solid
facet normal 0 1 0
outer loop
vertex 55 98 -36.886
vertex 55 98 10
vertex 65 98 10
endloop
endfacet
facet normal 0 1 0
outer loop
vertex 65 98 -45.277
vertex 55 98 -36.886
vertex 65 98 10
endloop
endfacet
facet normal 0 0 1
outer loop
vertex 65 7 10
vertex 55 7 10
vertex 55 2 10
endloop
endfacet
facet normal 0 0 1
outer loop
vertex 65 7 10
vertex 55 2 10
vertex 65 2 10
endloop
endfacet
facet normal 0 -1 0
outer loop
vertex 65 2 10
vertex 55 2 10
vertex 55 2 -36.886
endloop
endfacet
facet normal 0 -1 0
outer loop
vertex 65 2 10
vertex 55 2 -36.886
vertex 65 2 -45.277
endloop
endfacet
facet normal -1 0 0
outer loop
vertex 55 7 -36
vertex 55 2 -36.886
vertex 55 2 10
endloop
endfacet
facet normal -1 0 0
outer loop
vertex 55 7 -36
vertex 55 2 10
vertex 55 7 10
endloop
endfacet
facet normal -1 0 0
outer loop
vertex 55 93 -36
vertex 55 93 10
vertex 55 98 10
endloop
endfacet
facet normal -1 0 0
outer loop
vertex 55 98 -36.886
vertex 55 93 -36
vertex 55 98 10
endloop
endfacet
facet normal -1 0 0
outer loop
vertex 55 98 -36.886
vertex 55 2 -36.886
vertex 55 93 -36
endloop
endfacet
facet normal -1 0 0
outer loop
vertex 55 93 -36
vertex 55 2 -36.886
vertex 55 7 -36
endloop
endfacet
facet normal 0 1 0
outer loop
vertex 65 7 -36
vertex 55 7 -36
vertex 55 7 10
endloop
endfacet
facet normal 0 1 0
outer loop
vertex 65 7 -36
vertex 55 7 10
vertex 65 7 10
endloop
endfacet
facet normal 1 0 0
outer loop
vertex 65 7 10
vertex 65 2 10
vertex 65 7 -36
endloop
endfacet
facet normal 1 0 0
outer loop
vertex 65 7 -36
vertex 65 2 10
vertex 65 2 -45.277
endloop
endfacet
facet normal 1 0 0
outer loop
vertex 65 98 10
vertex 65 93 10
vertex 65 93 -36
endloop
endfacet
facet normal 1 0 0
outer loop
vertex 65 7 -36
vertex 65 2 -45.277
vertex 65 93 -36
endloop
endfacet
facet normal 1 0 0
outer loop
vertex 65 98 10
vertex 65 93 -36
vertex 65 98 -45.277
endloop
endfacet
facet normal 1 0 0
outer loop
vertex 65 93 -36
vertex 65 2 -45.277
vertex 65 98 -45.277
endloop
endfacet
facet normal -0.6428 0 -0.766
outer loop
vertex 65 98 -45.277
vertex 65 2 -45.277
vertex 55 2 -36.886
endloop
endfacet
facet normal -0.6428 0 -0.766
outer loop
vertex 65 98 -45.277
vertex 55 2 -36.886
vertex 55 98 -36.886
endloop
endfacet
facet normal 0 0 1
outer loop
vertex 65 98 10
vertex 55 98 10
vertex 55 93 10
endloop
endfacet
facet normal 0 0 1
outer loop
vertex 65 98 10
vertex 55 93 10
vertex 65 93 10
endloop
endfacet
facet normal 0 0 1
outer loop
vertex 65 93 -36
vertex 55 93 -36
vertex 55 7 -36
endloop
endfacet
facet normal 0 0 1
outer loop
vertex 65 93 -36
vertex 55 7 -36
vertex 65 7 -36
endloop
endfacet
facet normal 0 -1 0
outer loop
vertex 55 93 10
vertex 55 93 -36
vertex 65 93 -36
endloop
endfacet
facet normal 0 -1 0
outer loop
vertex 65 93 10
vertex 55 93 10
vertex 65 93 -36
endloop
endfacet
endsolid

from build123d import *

# Parameters (mm, degrees)
BOX016_W               = 5
BOX016_H               = 96
BOX016_DEPTH           = 60
BOX016_PLACEMENT_ANGLE = 310
BOX015_W               = 5
BOX015_H               = 96
BOX015_DEPTH           = 60
BOX015_PLACEMENT_ANGLE = 310
BOX014_W               = 5
BOX014_H               = 86
BOX014_DEPTH           = 2
BOX011_W               = 5
BOX011_H               = 86
BOX011_DEPTH           = 24
BOX006_W               = 10
BOX006_H               = 86
BOX006_DEPTH           = 20
BOX005_W               = 5
BOX005_H               = 86
BOX005_DEPTH           = 49
BOX003_W               = 10
BOX003_H               = 96
BOX003_DEPTH           = 49
BOX007_W               = 10
BOX007_H               = 96
BOX007_DEPTH           = 10


with BuildPart() as cube016:
    # Box016 → Box016 (new body)
    with BuildSketch(Plane.XY):
        with Locations((2.5, 48)):
            Rectangle(BOX016_W, BOX016_H)
    extrude(amount=BOX016_DEPTH)


with BuildPart() as cube016_1:
    # Box016 placement: moved
    add(cube016.part.moved(Location((70, 2, -56))).rotate(Axis((70, 2, -56), (0, 1, 0)), BOX016_PLACEMENT_ANGLE))


with BuildPart() as cube015:
    # Box015 → Box015 (new body)
    with BuildSketch(Plane.XY):
        with Locations((2.5, 48)):
            Rectangle(BOX015_W, BOX015_H)
    extrude(amount=BOX015_DEPTH)


with BuildPart() as cube015_1:
    # Box015 placement: moved
    add(cube015.part.moved(Location((70, 2, -59))).rotate(Axis((70, 2, -59), (0, 1, 0)), BOX015_PLACEMENT_ANGLE))


with BuildPart() as cube014:
    # Box014 → Box014 (new body)
    with BuildSketch(Plane(origin=(55, 7, -36), x_dir=(1, 0, 0), z_dir=(0, 0, 1))):
        with Locations((2.5, 43)):
            Rectangle(BOX014_W, BOX014_H)
    extrude(amount=BOX014_DEPTH)


with BuildPart() as cube011:
    # Box011 → Box011 (new body)
    with BuildSketch(Plane(origin=(40, 7, -34), x_dir=(1, 0, 0), z_dir=(0, 0, 1))):
        with Locations((2.5, 43)):
            Rectangle(BOX011_W, BOX011_H)
    extrude(amount=BOX011_DEPTH)


with BuildPart() as cube006:
    # Box006 → Box006 (new body)
    with BuildSketch(Plane(origin=(40, 7, -10), x_dir=(1, 0, 0), z_dir=(0, 0, 1))):
        with Locations((5, 43)):
            Rectangle(BOX006_W, BOX006_H)
    extrude(amount=BOX006_DEPTH)


with BuildPart() as cube005:
    # Box005 → Box005 (new body)
    with BuildSketch(Plane(origin=(45, 7, -39), x_dir=(1, 0, 0), z_dir=(0, 0, 1))):
        with Locations((2.5, 43)):
            Rectangle(BOX005_W, BOX005_H)
    extrude(amount=BOX005_DEPTH)


with BuildPart() as cut007:
    # Box003 → Box003 (new body)
    with BuildSketch(Plane(origin=(40, 2, -39), x_dir=(1, 0, 0), z_dir=(0, 0, 1))):
        with Locations((5, 48)):
            Rectangle(BOX003_W, BOX003_H)
    extrude(amount=BOX003_DEPTH)

    # Cut: cut Cube005
    add(cube005.part, mode=Mode.SUBTRACT)

    # Cut001: cut Cube006
    add(cube006.part, mode=Mode.SUBTRACT)

    # Cut004: cut Cube011
    add(cube011.part, mode=Mode.SUBTRACT)


with BuildPart() as cut007_1:
    # Cut004 placement: moved
    add(cut007.part.moved(Location((15, 0, 0))))

    # Cut007: cut Cube014
    add(cube014.part, mode=Mode.SUBTRACT)


with BuildPart() as cut009:
    # Box007 → Box007 (new body)
    with BuildSketch(Plane(origin=(55, 2, -46), x_dir=(1, 0, 0), z_dir=(0, 0, 1))):
        with Locations((5, 48)):
            Rectangle(BOX007_W, BOX007_H)
    extrude(amount=BOX007_DEPTH)

    # Fusion: union Cut007
    add(cut007_1.part)

    # Cut008: cut Cube015
    add(cube015_1.part, mode=Mode.SUBTRACT)

    # Cut009: cut Cube016
    add(cube016_1.part, mode=Mode.SUBTRACT)


solid = cut009.part
